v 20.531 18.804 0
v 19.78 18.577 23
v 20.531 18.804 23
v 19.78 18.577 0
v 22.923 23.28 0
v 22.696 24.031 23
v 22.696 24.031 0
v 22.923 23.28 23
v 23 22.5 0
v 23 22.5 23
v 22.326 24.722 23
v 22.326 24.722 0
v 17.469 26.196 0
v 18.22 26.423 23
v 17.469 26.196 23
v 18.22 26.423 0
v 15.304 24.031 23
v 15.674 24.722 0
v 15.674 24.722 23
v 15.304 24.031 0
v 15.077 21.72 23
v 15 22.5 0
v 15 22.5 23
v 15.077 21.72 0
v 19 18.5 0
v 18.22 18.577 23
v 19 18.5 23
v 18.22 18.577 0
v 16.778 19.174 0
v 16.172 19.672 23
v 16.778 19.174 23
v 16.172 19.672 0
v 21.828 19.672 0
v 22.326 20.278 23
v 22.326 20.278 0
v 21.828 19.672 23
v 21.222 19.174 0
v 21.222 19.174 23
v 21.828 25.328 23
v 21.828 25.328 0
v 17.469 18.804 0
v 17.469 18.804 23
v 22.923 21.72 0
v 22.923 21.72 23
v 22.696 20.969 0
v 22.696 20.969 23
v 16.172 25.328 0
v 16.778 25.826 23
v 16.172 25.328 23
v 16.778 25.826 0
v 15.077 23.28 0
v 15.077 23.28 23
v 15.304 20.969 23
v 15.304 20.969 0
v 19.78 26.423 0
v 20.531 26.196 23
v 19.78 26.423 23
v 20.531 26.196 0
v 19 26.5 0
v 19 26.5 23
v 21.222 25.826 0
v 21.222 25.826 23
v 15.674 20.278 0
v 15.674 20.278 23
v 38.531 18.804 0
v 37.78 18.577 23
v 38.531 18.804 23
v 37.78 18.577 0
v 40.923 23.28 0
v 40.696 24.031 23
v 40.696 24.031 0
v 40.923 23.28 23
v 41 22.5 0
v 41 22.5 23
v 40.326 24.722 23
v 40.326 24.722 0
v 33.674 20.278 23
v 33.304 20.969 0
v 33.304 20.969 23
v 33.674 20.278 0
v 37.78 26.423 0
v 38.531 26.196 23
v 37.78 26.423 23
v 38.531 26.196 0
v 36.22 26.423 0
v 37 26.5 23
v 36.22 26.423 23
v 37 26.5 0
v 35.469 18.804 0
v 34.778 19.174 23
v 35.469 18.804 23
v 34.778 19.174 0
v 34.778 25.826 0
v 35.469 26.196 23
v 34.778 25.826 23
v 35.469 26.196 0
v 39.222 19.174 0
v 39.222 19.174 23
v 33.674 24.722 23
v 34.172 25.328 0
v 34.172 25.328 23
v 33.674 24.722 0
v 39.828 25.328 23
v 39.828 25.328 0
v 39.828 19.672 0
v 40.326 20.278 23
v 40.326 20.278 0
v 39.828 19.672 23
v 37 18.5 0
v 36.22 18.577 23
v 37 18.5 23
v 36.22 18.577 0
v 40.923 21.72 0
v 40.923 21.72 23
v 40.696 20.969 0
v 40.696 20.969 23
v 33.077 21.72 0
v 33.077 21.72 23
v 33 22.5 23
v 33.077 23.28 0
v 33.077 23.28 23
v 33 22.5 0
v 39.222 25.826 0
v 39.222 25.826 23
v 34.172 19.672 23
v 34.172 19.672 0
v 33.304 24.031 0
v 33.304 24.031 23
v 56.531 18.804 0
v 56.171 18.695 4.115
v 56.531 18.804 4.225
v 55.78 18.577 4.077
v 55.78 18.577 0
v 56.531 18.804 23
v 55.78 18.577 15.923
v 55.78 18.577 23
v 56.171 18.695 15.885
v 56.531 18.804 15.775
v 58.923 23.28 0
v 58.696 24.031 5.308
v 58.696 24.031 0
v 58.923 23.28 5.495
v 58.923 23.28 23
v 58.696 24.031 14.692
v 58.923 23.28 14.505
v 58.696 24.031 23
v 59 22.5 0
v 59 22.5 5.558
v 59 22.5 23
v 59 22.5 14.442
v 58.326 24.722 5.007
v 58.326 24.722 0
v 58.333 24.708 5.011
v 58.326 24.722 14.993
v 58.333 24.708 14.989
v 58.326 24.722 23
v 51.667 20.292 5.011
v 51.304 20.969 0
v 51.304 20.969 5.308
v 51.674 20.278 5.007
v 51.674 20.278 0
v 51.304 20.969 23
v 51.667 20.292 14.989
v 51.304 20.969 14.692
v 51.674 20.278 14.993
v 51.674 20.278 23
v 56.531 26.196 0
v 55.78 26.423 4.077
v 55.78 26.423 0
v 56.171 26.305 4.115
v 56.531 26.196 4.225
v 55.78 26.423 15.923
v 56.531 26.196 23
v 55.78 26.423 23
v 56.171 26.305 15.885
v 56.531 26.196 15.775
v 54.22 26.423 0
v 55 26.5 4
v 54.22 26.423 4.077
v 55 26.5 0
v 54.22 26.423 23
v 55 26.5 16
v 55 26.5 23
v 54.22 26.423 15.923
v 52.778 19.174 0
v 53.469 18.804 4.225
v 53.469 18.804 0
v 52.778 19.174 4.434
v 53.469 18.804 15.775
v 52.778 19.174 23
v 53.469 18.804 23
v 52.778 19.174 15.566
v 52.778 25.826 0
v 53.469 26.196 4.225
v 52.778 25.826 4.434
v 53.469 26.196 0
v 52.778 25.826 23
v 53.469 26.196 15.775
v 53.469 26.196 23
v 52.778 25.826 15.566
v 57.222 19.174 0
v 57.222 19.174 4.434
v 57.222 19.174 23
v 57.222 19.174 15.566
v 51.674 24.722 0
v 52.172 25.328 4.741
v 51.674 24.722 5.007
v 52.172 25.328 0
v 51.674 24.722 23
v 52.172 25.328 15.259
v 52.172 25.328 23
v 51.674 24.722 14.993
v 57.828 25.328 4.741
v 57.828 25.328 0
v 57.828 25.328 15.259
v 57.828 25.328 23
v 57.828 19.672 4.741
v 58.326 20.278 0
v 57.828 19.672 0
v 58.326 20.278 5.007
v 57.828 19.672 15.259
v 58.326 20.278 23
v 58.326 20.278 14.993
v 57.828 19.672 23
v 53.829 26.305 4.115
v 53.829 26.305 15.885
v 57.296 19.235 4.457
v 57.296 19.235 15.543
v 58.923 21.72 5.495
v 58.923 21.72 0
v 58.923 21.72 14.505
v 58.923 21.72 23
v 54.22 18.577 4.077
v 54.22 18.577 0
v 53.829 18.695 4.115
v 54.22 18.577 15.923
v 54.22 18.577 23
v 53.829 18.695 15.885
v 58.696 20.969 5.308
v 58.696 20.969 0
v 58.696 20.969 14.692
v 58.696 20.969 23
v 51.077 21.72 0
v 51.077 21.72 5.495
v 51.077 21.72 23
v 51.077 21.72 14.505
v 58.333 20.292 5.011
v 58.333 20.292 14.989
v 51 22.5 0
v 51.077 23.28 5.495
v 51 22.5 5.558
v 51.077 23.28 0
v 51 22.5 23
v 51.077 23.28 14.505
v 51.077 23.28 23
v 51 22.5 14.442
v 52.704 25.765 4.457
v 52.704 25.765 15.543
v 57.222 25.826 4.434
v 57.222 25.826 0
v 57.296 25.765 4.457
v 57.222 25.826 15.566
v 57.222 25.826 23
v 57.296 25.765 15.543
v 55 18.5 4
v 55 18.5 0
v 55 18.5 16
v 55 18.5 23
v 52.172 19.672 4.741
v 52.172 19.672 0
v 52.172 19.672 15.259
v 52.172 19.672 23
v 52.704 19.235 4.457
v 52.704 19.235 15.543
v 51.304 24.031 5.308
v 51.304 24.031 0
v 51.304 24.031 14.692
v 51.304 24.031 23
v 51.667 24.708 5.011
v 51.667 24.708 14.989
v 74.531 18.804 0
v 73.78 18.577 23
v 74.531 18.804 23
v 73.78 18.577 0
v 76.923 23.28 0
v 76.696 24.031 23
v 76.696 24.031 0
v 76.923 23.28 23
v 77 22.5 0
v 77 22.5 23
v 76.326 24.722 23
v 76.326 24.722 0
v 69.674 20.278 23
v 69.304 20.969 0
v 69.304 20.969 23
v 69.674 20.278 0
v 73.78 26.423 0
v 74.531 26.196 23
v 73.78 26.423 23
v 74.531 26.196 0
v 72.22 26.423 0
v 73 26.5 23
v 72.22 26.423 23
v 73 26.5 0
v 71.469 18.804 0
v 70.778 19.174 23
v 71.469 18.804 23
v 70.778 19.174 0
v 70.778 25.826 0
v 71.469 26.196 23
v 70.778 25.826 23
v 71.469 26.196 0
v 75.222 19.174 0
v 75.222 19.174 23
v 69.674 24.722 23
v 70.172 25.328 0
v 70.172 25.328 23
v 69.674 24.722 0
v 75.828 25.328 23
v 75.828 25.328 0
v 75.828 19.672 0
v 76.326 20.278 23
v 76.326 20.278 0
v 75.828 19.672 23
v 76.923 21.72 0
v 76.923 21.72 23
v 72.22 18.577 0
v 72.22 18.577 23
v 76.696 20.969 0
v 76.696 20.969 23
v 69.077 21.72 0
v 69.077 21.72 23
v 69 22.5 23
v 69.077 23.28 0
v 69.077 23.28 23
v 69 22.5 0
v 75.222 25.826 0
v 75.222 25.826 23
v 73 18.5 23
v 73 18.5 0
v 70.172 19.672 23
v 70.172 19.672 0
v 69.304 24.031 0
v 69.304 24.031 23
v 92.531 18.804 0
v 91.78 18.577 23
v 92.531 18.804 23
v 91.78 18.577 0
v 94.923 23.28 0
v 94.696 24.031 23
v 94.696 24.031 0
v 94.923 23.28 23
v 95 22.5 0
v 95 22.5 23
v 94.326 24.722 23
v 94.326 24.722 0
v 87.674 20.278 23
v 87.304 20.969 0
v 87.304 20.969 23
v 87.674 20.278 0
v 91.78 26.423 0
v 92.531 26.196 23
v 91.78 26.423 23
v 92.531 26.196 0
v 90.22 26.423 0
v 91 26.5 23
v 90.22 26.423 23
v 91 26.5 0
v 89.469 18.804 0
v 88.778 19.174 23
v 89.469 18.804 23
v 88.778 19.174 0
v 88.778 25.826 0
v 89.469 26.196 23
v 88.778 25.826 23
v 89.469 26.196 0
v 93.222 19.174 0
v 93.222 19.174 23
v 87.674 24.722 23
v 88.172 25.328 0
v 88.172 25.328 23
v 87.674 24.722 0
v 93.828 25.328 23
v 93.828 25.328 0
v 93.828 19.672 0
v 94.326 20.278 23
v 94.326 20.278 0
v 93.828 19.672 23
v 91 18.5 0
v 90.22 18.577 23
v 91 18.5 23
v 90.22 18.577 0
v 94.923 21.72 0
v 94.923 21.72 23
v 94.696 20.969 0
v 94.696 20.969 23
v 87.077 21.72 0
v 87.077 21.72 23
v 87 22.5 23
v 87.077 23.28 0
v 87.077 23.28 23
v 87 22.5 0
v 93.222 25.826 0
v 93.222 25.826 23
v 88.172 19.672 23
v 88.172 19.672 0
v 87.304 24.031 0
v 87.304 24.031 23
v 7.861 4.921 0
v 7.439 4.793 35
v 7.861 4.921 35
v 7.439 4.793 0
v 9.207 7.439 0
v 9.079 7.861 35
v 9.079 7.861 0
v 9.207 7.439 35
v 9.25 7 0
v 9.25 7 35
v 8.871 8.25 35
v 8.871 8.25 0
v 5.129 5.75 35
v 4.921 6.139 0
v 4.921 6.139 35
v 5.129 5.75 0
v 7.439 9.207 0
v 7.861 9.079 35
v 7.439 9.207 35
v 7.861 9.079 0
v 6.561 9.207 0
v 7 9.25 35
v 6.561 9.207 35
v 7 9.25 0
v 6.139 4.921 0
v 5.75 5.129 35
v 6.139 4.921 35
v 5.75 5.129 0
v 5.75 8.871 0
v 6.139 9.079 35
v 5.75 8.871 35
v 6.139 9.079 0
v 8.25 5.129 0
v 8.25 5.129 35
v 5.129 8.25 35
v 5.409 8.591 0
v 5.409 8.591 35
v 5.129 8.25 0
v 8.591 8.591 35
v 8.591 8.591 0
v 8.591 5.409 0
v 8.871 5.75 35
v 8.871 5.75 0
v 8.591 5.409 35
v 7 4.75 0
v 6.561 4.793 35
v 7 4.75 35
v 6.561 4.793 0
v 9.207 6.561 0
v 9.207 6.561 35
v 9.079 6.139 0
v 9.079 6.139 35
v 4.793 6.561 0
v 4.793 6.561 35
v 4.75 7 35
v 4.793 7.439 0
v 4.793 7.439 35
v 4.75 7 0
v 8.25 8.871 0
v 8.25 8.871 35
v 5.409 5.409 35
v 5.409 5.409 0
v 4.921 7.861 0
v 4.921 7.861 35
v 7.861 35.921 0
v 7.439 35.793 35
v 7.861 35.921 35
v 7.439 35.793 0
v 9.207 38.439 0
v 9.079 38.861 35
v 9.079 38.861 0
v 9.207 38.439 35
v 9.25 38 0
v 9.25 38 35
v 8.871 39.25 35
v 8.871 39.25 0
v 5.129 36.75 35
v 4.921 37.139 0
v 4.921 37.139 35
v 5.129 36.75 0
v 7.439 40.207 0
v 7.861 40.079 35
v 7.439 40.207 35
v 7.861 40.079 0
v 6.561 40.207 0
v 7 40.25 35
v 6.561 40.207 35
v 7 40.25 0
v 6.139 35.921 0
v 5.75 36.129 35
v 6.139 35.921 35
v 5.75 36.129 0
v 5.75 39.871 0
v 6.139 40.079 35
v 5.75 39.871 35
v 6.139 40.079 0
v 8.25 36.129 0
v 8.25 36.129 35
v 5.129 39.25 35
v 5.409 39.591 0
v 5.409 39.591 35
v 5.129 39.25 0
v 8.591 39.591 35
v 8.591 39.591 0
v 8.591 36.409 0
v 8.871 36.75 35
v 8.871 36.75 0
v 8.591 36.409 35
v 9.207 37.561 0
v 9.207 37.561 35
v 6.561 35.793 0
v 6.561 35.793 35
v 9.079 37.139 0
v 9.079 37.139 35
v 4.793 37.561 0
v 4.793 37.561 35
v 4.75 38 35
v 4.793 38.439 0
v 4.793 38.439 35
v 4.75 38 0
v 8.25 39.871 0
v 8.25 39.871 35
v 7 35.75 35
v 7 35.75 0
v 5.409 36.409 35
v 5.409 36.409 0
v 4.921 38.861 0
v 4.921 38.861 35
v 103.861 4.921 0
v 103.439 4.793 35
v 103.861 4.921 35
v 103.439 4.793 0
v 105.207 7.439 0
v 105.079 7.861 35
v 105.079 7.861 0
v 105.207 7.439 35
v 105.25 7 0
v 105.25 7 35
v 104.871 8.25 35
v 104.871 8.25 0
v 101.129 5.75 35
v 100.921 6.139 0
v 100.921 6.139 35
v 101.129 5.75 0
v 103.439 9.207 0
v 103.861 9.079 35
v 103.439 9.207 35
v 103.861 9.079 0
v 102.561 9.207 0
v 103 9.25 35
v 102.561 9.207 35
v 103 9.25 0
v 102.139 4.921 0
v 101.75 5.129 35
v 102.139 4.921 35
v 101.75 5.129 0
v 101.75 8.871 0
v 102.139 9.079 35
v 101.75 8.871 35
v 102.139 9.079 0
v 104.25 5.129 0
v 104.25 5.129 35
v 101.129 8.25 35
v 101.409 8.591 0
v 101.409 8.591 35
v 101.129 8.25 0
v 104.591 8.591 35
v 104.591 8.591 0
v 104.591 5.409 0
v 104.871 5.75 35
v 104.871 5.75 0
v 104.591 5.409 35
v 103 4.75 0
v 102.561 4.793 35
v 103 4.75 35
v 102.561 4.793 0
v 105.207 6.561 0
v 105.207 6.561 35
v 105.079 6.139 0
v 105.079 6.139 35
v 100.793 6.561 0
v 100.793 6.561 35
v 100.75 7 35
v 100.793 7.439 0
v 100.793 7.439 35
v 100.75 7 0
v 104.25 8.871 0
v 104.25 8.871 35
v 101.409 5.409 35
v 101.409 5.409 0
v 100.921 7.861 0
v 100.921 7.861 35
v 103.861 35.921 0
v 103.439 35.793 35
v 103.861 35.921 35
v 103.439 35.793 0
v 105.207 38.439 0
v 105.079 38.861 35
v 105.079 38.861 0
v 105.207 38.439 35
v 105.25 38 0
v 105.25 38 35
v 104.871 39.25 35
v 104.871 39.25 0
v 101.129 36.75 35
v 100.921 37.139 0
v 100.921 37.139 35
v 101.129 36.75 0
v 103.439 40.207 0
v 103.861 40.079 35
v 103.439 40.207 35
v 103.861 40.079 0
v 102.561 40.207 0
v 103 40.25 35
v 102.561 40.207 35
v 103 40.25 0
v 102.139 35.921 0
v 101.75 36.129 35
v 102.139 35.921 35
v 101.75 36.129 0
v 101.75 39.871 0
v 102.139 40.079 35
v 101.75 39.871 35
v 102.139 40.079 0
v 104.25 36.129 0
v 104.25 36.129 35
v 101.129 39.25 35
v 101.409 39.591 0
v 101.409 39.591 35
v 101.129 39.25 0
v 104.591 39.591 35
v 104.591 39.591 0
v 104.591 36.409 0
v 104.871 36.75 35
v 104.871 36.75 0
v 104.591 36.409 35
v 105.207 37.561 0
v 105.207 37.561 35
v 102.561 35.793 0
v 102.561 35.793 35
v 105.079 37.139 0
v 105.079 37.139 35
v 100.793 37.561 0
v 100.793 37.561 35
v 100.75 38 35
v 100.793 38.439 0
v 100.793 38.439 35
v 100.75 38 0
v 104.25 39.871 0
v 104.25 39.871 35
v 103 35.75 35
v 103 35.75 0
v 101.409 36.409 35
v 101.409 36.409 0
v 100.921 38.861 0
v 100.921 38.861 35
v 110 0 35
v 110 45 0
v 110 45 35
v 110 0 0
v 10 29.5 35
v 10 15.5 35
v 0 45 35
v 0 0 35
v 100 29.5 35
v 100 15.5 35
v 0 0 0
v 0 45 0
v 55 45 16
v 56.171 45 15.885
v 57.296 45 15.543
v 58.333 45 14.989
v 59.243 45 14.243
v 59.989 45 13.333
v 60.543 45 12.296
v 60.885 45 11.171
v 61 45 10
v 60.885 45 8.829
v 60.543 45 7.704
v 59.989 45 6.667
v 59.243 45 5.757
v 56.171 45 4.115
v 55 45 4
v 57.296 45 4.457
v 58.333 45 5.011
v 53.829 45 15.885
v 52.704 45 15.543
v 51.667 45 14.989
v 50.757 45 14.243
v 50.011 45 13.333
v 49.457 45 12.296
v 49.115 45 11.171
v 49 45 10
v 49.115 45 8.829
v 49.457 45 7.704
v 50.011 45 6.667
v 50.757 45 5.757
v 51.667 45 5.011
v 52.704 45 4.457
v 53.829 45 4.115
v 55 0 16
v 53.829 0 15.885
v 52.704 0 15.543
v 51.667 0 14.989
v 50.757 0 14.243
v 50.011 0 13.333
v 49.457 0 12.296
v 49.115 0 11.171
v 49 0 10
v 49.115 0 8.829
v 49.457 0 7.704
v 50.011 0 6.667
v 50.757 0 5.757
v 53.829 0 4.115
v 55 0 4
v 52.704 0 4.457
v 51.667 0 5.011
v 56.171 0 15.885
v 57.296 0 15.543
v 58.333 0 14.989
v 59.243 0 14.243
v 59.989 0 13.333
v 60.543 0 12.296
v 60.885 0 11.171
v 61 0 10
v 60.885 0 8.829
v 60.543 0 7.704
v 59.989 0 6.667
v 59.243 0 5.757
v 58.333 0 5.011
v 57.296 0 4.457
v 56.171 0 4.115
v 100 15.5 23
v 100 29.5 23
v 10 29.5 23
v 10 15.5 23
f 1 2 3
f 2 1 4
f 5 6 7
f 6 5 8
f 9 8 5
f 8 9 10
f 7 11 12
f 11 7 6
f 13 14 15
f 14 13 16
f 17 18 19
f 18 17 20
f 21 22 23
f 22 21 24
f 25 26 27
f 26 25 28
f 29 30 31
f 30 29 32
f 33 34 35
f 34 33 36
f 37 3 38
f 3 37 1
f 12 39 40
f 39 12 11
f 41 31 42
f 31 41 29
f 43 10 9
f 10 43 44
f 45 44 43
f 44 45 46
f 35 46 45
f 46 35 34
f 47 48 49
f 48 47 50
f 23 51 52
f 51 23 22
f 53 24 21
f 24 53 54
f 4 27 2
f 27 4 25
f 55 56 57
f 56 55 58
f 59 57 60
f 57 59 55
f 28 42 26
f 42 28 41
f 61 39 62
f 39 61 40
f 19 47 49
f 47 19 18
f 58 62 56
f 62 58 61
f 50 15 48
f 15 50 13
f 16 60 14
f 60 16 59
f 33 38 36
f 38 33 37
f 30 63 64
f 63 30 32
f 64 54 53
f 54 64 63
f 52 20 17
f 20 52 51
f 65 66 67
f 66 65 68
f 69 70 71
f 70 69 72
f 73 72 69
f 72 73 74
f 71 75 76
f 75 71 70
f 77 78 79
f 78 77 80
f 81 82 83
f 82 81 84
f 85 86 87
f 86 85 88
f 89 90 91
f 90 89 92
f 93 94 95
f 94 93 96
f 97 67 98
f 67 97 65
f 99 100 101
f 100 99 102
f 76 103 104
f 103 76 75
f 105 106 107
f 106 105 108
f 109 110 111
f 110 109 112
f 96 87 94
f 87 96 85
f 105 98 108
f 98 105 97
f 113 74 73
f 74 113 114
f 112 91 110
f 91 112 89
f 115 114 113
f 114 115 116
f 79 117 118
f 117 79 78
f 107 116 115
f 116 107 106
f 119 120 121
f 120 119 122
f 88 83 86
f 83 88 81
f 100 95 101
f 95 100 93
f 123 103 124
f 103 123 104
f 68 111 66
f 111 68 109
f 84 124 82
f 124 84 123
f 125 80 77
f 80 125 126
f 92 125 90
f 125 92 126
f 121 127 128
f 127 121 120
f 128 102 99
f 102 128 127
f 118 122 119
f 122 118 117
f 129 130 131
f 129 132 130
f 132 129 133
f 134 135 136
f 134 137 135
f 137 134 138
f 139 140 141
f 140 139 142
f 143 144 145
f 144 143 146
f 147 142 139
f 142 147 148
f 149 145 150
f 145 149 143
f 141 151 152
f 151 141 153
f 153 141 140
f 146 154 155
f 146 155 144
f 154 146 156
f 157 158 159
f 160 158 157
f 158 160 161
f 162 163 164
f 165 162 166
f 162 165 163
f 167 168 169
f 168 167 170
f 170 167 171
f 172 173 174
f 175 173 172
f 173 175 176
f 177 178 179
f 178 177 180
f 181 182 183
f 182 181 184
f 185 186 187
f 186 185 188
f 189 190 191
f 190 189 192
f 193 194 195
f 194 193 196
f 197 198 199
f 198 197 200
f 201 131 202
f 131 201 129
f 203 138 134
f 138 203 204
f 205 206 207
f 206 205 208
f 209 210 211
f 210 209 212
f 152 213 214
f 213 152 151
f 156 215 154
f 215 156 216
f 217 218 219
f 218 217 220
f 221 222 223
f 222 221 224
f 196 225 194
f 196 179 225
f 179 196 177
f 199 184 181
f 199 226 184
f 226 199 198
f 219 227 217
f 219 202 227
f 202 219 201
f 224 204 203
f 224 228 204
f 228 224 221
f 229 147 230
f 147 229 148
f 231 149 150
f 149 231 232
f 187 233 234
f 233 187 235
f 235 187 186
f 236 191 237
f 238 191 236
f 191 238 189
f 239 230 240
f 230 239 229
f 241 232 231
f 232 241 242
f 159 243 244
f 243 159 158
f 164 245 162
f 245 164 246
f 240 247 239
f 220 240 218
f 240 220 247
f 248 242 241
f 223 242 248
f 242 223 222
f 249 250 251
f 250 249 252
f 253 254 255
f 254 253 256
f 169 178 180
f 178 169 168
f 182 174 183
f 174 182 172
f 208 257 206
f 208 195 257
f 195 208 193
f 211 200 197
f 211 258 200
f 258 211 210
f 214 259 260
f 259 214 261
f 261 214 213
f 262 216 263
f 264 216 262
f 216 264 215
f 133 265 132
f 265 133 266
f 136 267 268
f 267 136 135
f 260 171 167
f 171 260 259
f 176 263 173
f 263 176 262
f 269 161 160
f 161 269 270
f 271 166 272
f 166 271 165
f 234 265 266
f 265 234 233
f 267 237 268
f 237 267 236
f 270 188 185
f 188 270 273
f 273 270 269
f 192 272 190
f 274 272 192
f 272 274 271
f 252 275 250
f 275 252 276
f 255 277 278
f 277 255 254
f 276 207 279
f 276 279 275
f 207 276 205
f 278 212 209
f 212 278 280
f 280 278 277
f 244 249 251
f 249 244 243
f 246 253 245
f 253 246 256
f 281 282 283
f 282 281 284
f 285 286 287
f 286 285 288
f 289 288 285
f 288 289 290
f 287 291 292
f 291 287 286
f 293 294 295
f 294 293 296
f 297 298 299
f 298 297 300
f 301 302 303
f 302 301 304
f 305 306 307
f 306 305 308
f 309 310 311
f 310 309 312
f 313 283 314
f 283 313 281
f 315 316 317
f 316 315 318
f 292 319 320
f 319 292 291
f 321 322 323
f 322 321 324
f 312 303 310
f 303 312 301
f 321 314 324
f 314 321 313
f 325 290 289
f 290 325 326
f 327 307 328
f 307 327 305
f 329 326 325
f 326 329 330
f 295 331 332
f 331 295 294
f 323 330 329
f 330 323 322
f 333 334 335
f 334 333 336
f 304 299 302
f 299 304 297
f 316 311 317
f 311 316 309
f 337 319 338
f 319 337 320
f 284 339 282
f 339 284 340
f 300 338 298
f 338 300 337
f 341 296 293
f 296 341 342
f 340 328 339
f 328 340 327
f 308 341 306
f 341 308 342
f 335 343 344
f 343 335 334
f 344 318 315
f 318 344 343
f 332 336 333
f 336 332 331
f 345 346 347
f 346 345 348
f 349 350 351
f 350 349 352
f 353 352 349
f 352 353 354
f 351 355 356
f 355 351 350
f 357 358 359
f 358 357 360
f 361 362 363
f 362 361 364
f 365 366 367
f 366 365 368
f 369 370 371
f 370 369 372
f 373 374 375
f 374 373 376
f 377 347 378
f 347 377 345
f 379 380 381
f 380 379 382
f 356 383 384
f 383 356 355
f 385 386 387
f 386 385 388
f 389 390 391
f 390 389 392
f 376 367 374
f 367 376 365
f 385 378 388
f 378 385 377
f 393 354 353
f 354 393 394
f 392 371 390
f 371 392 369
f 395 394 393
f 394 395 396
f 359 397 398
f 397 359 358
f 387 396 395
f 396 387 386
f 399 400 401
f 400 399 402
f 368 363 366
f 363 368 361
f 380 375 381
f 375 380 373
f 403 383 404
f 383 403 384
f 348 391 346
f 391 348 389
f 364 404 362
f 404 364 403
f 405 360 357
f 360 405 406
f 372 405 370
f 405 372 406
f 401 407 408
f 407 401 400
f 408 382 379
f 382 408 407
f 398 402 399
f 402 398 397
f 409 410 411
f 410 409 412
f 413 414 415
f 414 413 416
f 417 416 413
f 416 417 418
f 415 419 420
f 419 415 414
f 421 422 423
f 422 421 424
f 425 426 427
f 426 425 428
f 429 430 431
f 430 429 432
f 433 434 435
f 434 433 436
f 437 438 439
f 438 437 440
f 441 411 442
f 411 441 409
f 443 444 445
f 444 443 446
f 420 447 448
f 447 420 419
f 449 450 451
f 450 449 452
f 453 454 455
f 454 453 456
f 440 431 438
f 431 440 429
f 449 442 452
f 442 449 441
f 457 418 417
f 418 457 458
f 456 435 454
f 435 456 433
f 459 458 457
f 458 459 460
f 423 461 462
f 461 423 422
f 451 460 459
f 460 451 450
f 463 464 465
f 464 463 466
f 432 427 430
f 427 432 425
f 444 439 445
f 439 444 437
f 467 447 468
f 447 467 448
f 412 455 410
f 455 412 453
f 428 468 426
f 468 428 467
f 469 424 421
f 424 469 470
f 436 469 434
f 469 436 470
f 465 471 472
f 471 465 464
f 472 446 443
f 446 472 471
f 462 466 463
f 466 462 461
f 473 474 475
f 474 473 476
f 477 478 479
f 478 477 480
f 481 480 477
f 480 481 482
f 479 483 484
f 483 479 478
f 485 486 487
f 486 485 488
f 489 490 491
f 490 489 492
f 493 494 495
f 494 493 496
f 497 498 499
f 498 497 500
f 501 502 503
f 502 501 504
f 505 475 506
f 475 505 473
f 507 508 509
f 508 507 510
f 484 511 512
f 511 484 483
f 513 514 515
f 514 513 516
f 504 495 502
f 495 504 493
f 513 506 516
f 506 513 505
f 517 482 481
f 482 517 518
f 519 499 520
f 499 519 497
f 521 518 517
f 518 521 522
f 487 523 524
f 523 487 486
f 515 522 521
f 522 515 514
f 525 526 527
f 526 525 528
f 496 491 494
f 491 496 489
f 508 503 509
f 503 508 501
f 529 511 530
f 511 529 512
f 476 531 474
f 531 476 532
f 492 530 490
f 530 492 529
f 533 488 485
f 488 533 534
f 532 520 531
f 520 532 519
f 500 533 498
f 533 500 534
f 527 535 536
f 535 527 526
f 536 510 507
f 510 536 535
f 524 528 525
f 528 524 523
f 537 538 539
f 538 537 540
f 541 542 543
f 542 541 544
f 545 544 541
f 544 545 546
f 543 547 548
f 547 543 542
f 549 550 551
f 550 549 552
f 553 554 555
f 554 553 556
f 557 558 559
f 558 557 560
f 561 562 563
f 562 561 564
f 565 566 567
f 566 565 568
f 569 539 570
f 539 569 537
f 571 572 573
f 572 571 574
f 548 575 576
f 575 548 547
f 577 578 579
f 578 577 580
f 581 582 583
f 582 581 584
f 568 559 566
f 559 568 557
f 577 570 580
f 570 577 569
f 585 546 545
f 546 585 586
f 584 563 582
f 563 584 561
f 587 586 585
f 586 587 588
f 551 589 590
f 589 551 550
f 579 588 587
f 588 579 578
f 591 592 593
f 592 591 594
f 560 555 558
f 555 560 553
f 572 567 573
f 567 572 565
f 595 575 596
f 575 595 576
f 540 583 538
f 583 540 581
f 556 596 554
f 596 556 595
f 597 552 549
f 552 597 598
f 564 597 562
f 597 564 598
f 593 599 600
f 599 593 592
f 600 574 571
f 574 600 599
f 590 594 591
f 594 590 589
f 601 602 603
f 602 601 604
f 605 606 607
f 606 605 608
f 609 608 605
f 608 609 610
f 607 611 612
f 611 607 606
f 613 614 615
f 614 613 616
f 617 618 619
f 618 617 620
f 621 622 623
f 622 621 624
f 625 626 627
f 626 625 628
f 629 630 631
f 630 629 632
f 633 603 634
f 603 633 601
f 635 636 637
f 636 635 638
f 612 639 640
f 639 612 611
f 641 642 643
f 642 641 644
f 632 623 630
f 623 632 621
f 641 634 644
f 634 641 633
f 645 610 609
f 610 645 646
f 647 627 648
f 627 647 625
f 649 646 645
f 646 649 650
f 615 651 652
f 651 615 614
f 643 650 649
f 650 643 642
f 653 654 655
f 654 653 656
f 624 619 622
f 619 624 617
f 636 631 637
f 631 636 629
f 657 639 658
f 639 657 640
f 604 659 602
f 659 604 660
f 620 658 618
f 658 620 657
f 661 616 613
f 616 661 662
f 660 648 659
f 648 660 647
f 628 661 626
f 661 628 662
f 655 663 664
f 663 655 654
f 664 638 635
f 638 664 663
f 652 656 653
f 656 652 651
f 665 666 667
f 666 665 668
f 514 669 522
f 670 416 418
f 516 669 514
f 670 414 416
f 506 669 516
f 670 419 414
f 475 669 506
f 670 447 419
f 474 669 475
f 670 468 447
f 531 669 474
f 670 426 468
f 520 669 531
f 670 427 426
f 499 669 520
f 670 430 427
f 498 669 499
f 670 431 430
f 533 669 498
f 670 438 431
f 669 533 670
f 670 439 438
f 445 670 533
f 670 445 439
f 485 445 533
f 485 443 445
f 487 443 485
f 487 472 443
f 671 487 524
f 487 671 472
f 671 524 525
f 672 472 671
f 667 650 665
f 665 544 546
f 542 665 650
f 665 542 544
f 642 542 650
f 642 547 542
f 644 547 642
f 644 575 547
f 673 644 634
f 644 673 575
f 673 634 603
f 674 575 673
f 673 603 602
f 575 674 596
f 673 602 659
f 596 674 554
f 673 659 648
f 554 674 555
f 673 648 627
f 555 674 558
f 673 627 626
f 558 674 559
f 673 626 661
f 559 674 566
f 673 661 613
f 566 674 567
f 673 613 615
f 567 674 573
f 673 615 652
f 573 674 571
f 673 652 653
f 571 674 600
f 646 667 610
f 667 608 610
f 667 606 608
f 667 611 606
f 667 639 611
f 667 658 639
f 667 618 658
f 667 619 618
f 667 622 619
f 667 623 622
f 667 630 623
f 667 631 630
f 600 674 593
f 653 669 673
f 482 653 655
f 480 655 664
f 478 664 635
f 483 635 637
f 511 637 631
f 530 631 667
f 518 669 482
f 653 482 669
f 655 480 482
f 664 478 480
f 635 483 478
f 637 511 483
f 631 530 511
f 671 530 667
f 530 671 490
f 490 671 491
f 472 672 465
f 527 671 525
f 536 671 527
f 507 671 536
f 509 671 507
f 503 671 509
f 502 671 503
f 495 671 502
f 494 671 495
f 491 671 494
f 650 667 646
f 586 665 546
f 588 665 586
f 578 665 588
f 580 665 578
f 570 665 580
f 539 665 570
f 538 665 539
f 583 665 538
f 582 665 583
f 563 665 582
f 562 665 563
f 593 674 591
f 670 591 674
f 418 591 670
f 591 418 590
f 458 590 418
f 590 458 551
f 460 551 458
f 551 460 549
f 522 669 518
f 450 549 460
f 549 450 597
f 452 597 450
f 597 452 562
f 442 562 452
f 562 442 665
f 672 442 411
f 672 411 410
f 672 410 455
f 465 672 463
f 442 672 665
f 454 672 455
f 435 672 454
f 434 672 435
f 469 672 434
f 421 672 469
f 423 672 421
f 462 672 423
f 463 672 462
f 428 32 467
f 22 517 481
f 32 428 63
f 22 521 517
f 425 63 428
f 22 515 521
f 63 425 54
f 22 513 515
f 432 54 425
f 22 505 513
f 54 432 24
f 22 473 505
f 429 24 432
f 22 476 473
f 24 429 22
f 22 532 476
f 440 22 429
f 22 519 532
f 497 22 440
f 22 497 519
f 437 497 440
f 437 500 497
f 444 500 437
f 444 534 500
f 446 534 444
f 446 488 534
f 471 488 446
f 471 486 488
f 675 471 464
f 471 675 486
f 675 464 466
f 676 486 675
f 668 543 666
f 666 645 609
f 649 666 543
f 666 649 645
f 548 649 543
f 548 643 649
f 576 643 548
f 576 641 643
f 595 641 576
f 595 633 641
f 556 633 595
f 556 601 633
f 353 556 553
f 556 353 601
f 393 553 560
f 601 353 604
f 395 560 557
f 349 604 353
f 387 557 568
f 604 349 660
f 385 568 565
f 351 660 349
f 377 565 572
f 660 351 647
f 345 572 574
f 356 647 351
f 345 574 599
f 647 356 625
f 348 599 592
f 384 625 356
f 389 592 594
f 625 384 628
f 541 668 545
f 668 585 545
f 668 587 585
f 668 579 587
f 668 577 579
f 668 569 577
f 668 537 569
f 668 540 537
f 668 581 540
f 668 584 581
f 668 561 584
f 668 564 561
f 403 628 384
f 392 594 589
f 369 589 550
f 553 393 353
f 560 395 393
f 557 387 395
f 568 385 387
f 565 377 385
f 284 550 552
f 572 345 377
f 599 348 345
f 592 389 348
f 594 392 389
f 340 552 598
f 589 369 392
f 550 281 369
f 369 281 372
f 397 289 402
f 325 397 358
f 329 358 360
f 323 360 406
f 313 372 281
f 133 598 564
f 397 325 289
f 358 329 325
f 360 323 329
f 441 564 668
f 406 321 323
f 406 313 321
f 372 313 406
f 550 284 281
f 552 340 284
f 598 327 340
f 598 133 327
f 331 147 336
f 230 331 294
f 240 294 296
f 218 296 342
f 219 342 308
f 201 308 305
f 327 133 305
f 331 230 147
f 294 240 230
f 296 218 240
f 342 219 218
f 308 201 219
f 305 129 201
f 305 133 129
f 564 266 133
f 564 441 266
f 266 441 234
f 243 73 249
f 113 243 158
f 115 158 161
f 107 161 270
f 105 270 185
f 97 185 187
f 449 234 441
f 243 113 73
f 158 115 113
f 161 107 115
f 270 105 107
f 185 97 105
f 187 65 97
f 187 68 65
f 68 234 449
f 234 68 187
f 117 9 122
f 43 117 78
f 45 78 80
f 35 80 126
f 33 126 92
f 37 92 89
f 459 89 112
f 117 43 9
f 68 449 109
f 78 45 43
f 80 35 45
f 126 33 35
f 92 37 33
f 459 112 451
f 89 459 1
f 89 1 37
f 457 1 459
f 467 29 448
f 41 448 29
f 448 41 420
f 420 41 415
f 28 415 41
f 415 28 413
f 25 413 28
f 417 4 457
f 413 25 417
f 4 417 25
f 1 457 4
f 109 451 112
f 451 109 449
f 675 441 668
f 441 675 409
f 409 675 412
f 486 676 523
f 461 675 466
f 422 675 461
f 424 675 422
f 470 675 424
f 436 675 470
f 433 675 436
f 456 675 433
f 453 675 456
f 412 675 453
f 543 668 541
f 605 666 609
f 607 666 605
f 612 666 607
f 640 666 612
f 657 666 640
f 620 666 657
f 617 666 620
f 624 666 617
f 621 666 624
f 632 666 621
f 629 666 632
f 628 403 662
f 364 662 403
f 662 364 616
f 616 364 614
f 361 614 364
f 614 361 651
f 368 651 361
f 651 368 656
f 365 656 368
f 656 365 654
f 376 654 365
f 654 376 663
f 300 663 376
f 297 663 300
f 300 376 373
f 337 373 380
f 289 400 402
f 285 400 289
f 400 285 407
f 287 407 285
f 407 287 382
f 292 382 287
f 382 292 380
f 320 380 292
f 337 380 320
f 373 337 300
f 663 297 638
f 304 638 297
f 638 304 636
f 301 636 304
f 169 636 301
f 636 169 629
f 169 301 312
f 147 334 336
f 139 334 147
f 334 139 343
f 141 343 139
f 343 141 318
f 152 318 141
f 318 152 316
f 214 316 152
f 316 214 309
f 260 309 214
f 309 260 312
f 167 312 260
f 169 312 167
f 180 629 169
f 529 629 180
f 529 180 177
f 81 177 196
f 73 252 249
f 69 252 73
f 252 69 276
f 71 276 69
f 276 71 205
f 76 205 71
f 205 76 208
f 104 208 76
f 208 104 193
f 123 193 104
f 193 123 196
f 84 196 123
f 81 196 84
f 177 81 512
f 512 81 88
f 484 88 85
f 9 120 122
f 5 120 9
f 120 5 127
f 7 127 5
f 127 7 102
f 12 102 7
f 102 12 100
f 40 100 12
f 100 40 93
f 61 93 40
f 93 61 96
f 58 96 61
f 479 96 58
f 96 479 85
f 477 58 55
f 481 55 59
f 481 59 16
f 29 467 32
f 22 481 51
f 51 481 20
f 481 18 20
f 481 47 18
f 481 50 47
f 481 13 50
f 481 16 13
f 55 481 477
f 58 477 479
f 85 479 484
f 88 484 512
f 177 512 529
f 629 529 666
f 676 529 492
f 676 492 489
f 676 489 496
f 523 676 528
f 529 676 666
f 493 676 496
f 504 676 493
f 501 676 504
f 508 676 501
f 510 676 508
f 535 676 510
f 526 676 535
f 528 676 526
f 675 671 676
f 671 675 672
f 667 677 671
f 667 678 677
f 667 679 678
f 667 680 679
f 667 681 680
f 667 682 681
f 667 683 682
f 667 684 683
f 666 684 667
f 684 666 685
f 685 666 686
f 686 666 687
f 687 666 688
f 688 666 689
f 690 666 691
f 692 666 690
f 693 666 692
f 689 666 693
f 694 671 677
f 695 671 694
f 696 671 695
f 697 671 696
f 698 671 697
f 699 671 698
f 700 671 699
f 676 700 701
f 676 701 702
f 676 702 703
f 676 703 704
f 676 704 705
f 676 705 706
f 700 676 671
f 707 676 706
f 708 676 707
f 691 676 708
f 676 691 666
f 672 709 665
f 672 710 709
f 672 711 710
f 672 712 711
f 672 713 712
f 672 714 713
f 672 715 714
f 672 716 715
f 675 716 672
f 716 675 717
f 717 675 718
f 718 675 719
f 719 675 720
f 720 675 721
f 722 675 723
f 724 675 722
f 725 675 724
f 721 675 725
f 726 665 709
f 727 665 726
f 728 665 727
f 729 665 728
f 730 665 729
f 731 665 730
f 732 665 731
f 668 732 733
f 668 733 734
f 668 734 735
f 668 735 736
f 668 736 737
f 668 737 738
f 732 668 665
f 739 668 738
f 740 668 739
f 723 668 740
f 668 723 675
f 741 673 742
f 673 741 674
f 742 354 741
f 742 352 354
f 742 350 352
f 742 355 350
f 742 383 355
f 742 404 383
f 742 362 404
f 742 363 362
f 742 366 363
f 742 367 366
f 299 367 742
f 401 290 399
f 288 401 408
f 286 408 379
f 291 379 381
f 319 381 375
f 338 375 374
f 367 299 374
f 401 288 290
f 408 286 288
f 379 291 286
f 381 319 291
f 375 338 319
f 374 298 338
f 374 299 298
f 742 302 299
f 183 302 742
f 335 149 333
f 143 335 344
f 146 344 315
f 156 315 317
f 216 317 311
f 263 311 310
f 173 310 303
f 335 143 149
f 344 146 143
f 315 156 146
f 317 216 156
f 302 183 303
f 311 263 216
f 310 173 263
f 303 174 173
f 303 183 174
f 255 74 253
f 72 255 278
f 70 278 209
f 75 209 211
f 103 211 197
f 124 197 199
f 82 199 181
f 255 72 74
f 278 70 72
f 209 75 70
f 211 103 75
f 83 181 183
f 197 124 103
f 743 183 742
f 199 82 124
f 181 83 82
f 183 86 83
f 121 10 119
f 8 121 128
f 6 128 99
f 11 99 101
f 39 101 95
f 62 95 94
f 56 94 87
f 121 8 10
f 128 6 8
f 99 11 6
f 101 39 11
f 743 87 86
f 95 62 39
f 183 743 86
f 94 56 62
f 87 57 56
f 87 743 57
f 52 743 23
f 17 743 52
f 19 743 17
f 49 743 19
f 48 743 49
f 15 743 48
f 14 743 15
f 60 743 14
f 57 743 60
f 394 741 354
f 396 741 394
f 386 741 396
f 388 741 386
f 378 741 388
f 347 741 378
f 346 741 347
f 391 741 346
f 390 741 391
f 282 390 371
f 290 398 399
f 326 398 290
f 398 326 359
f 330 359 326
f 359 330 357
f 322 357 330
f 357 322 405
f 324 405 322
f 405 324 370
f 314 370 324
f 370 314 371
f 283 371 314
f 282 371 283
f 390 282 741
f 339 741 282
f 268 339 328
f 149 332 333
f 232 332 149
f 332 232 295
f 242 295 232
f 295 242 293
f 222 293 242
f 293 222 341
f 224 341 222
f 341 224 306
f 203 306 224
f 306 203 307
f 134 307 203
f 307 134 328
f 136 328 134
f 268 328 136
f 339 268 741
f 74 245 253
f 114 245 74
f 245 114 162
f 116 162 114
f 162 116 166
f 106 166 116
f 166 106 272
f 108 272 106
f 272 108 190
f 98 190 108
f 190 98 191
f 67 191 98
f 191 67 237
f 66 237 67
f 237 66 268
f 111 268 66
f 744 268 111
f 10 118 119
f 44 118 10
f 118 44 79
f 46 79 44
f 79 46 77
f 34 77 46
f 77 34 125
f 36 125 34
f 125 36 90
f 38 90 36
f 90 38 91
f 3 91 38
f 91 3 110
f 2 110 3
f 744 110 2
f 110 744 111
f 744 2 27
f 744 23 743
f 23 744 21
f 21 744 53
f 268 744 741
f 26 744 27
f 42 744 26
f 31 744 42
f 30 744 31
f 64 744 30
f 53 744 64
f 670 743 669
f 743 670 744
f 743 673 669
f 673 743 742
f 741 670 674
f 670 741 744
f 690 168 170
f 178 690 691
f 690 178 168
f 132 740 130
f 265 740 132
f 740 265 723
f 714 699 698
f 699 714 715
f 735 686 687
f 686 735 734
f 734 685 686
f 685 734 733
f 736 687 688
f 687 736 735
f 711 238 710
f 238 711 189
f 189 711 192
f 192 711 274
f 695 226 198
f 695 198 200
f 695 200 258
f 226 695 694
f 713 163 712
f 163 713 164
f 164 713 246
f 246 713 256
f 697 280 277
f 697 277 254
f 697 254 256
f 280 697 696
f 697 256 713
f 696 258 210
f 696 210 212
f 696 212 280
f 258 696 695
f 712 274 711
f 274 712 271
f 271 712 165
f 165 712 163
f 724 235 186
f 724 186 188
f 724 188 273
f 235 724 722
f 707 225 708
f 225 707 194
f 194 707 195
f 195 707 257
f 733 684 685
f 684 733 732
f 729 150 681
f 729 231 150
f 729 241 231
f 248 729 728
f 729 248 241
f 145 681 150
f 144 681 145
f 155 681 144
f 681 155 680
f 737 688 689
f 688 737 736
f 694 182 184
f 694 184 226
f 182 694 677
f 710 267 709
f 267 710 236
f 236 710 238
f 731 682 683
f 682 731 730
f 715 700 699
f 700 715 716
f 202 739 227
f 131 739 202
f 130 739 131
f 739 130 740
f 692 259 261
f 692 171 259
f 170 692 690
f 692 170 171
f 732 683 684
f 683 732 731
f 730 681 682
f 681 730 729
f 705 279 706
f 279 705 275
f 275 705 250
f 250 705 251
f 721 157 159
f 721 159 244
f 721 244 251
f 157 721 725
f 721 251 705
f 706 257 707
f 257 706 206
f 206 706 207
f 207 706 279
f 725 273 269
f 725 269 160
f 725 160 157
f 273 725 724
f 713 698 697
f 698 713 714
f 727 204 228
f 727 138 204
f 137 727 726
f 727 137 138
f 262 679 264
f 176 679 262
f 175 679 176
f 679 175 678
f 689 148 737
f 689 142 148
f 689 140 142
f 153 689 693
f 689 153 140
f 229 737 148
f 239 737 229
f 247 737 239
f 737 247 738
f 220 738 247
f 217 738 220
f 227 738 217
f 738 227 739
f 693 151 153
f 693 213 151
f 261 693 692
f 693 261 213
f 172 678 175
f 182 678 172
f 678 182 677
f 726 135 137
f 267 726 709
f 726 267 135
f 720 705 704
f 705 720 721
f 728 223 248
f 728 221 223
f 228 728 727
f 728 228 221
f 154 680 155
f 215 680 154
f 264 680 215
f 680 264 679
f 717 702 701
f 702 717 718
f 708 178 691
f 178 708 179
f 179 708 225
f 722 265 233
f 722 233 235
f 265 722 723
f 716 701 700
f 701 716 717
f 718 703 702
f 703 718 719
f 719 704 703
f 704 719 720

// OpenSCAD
$fn = 32;

// ----------------------------------------------------------------------
// Manifold block: side_outlet manifold
// ----------------------------------------------------------------------

// --- parameters (mm) ---
block_l = 110;            // block length, X
block_w = 45;             // block width, Y
block_h = 35;             // block height, Z
port_d = 8;               // port bore diameter
port_pitch = 18;          // port pitch along X
gallery_d = 14;           // top gallery width, Y
gallery_depth = 12;       // gallery pocket depth
wall_p = 10;              // gallery end wall thickness, X
mnt_d = 4.5;              // mounting hole diameter
mnt_in = 7;               // mounting hole inset from the edges
out_d = 12;               // outlet bore diameter
out_z = 10;               // outlet axis height
fit_tol = 0.1;            // tolerance for press fits, mm
free_tol = 0.3;           // tolerance for clearance fits, mm

n_ports = 5;  // ports in the row
port_x0 = (block_l - (n_ports - 1) * port_pitch) / 2;  // first port X

difference() {
  cube([block_l, block_w, block_h]);
  for (i = [0 : n_ports - 1])
    translate([port_x0 + i * port_pitch, block_w / 2, -1])
      cylinder(h = block_h + 2, d = port_d);
  translate([wall_p, block_w / 2 - gallery_d / 2, block_h - gallery_depth])
    cube([block_l - 2 * wall_p, gallery_d, gallery_depth + 1]);
  for (cx = [mnt_in, block_l - mnt_in])
    for (cy = [mnt_in, block_w - mnt_in])
      translate([cx, cy, -1]) cylinder(h = block_h + 2, d = mnt_d);
  translate([block_l / 2, -1, out_z]) rotate([-90, 0, 0])
    cylinder(h = block_w + 2, d = out_d);
}
